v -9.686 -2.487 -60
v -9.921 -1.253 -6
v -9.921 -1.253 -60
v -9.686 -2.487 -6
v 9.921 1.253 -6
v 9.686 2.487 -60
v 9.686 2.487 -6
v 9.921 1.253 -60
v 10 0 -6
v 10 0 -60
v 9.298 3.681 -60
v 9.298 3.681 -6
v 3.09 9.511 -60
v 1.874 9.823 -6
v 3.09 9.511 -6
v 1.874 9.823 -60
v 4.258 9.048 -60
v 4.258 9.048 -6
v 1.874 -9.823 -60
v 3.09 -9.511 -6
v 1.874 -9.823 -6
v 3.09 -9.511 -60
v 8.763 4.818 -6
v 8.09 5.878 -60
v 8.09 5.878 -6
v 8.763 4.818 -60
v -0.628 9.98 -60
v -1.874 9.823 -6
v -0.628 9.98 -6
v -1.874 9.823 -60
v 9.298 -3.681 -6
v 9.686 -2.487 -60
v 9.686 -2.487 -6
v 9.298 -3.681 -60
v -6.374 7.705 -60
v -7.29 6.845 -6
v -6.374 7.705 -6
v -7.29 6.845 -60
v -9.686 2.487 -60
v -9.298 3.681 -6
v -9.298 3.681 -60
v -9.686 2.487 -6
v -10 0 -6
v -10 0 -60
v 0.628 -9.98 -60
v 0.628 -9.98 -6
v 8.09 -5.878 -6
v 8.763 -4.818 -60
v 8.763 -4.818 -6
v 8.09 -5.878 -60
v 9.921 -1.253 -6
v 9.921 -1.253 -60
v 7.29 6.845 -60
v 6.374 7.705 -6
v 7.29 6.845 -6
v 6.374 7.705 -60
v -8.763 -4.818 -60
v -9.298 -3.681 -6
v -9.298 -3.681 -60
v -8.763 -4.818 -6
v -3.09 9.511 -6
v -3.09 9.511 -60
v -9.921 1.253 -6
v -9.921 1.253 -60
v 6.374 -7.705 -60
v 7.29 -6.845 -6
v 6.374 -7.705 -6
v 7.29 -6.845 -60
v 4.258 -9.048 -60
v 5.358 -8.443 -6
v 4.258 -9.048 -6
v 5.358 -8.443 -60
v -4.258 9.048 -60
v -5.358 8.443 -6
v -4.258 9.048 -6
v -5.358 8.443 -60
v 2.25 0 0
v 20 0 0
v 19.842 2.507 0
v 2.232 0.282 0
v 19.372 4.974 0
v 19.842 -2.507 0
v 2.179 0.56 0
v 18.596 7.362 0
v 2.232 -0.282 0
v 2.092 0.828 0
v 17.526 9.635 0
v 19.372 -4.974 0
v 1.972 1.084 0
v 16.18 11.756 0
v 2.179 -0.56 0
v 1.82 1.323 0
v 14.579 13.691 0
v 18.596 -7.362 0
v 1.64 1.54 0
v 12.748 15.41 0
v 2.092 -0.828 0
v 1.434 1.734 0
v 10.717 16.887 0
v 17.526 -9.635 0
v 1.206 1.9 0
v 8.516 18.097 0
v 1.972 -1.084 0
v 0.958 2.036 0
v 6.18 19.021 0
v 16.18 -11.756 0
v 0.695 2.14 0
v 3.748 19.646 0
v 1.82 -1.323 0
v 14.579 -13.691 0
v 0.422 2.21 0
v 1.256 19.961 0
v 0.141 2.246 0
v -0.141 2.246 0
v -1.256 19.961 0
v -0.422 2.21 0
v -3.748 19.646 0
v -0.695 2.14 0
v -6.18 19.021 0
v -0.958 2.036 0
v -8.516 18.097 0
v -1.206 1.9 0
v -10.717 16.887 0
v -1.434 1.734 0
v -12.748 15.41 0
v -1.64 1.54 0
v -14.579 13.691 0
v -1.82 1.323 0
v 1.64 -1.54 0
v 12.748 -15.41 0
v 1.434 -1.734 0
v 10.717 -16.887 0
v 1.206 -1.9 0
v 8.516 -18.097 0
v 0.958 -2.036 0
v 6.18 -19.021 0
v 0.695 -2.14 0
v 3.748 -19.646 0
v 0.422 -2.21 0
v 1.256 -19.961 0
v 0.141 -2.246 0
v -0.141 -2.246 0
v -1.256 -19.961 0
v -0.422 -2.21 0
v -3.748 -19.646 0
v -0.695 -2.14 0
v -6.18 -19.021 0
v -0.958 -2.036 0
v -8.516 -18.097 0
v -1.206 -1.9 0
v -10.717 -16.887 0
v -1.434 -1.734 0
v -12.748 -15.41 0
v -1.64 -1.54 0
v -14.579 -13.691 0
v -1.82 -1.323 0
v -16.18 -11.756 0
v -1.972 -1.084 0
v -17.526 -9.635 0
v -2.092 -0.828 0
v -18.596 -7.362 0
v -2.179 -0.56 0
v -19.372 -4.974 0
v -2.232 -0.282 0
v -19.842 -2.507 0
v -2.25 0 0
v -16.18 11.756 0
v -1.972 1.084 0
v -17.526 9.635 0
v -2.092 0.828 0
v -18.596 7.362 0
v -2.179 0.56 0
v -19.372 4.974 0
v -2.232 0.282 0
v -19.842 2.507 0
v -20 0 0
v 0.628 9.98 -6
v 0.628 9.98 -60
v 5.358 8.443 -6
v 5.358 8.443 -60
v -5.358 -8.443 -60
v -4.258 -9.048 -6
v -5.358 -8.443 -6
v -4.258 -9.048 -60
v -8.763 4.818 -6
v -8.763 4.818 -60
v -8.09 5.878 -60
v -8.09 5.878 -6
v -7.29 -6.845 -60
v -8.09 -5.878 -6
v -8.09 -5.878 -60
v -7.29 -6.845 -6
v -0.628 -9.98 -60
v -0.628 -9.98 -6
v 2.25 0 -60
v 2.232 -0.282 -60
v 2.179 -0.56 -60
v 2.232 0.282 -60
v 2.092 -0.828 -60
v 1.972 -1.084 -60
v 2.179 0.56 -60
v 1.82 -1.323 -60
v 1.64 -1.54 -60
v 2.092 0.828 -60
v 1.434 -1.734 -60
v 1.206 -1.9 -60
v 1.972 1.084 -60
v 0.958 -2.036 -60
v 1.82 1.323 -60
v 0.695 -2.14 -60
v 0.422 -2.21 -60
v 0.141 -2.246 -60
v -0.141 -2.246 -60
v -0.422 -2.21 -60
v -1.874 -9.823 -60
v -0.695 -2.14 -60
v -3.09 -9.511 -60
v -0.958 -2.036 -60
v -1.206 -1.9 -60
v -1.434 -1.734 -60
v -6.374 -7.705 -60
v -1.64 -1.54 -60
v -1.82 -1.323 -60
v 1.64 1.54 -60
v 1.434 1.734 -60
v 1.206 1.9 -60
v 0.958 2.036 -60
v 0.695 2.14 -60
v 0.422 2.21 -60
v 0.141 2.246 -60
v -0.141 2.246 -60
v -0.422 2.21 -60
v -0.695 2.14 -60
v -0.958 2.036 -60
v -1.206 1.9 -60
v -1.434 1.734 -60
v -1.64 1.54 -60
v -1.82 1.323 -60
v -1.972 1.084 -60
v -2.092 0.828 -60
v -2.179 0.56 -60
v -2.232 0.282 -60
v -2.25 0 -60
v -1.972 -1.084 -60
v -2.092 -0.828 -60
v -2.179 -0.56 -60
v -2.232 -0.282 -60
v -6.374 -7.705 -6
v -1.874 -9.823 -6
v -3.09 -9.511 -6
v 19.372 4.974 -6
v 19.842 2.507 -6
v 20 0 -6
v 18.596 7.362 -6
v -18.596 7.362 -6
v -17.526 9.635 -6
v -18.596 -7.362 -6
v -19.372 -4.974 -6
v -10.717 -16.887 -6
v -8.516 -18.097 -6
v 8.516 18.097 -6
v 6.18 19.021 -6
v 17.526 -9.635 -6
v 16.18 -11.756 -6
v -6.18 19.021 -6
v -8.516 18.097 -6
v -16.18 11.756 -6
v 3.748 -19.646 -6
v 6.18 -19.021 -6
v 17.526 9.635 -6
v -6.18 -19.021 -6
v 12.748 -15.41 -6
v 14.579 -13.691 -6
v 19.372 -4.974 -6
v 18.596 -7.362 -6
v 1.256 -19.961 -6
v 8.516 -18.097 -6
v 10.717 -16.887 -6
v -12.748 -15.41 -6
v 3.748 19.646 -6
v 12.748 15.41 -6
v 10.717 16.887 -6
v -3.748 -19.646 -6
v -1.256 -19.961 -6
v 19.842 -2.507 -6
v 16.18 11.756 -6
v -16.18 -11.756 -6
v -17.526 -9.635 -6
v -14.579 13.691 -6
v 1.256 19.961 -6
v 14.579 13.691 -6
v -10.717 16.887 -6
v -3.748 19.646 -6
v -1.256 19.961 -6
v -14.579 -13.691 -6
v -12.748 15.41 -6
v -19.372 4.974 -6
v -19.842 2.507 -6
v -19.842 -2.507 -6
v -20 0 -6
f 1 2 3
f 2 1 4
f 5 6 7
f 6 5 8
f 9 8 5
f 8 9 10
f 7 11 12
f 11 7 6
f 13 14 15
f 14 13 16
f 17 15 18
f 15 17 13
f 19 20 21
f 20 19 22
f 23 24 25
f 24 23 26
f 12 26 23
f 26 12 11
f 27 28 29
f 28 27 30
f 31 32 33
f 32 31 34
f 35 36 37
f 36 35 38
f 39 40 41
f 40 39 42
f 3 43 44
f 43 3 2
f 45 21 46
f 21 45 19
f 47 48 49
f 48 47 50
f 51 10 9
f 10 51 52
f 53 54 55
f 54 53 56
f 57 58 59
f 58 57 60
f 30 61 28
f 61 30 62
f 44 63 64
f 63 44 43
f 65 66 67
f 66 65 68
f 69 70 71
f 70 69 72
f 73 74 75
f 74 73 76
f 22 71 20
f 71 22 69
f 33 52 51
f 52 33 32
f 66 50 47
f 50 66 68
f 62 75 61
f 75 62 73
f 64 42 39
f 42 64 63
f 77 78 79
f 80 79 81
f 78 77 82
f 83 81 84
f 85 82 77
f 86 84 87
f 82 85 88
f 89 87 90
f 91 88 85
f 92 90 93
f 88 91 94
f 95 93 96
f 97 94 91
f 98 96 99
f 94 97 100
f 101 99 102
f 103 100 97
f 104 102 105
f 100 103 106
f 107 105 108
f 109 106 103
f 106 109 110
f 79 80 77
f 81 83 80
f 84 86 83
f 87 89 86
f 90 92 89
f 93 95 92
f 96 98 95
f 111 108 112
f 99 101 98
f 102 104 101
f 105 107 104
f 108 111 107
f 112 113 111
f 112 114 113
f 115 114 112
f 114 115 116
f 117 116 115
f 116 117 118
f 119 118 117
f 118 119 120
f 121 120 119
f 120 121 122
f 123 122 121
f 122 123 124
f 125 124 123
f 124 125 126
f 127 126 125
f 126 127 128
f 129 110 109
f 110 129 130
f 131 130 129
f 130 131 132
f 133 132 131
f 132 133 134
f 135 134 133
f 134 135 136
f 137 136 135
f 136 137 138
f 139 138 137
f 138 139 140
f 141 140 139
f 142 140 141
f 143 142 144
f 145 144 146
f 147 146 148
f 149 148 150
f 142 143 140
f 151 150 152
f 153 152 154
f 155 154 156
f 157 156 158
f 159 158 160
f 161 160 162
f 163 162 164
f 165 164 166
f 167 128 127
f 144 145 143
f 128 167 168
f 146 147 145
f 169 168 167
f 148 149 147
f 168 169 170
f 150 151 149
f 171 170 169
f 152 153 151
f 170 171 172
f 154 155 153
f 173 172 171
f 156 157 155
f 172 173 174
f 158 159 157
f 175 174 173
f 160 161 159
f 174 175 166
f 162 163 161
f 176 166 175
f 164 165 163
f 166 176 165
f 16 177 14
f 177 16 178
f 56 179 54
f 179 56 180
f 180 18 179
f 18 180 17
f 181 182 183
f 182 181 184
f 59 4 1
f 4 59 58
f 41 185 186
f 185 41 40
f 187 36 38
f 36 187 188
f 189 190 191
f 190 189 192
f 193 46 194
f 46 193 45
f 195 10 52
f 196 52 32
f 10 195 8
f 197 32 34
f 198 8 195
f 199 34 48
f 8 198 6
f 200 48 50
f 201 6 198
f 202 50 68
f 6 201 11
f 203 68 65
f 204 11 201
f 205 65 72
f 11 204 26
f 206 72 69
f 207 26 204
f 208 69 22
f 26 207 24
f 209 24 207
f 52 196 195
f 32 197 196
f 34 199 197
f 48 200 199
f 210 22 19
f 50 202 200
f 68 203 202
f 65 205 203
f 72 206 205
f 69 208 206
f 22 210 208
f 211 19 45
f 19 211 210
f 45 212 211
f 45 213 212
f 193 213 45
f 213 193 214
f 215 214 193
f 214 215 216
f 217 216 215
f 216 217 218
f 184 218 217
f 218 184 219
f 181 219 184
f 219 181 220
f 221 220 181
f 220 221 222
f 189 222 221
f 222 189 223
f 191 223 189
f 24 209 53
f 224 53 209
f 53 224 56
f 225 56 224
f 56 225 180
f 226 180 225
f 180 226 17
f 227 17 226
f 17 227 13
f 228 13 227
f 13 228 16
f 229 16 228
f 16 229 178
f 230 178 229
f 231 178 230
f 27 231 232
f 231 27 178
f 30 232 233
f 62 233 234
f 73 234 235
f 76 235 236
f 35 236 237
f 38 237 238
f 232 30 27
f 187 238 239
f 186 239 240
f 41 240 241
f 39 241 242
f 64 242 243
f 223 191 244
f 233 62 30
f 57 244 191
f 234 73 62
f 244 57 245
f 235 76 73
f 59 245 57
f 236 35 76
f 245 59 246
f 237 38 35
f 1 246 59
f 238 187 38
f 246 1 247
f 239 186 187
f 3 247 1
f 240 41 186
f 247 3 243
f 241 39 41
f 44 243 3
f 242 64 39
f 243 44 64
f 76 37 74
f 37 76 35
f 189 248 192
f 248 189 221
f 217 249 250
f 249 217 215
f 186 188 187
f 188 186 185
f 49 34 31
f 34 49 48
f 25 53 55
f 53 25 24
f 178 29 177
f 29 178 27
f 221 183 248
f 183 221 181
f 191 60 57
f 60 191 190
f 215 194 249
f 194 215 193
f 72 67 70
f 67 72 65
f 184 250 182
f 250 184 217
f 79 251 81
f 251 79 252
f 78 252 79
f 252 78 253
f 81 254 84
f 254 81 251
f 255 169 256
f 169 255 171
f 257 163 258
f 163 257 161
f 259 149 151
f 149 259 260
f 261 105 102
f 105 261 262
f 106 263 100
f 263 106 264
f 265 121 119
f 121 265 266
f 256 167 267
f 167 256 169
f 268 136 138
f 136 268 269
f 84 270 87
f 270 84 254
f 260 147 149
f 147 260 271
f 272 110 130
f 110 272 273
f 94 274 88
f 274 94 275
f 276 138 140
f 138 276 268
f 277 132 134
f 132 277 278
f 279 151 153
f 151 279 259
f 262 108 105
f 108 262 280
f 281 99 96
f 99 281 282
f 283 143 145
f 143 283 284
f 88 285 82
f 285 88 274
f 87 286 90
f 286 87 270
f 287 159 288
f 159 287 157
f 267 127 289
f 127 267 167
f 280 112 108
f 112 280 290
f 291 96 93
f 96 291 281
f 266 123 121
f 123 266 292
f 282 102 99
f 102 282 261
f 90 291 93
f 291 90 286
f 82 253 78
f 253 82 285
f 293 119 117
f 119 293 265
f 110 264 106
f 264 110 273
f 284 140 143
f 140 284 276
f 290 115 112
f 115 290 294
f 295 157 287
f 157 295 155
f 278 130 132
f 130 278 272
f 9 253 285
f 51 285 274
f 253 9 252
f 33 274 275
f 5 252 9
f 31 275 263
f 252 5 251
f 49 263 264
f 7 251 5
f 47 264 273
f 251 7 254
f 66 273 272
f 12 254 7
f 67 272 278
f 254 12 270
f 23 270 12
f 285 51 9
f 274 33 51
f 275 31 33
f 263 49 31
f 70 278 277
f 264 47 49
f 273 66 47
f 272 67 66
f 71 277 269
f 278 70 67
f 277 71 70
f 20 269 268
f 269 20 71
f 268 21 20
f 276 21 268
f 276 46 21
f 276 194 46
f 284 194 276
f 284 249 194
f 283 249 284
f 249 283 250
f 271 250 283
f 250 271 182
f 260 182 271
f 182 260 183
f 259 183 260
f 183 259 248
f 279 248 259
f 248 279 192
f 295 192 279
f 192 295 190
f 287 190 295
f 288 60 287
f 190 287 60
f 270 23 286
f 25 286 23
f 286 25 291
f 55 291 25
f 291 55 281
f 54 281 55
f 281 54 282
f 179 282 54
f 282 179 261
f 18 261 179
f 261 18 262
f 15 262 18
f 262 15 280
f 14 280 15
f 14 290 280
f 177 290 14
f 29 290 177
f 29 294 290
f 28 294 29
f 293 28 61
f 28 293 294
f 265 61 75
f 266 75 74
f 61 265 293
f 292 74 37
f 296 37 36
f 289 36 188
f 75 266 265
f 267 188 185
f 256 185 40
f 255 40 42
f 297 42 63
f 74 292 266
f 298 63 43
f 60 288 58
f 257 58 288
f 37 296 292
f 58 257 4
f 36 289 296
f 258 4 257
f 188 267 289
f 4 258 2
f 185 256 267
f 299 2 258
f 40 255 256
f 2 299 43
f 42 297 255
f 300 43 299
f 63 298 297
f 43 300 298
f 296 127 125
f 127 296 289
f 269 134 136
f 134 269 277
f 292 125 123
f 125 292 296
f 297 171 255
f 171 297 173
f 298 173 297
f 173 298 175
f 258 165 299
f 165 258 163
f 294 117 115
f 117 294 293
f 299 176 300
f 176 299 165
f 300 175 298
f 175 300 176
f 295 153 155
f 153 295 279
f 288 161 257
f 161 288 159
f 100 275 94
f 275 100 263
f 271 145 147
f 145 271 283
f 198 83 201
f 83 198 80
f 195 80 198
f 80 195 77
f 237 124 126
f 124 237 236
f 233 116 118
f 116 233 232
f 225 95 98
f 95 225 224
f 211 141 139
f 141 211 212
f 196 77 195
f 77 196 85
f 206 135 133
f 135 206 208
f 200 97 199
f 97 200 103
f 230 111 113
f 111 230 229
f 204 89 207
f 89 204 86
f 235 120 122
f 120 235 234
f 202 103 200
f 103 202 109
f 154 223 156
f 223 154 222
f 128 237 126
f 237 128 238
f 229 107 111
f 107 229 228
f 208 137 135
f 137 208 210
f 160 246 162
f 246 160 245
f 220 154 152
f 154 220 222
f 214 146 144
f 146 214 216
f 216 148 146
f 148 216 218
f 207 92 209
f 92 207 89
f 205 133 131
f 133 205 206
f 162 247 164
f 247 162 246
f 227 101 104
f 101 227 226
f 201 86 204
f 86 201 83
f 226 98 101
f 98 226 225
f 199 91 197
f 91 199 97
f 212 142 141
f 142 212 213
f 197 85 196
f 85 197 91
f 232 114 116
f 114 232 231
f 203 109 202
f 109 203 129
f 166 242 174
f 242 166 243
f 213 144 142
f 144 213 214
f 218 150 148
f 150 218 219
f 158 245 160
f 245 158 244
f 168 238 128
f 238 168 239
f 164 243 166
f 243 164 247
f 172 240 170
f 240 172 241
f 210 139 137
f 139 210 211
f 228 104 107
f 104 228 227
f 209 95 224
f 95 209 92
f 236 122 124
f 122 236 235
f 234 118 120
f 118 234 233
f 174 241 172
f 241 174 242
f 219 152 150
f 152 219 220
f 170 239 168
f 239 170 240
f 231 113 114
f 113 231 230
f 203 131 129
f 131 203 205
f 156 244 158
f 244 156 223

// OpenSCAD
$fn = 50;


difference() {
	union() {
		translate(v = [0, 0, -60.0000000000]) {
			cylinder(h = 60, r = 10.0000000000);
		}
		translate(v = [0, 0, -6.0000000000]) {
			cylinder(h = 6, r = 20.0000000000);
		}
	}
	union() {
		#translate(v = [0, 0, -60]) {
			cylinder(h = 60, r = 2.2500000000);
		}
	}
}
